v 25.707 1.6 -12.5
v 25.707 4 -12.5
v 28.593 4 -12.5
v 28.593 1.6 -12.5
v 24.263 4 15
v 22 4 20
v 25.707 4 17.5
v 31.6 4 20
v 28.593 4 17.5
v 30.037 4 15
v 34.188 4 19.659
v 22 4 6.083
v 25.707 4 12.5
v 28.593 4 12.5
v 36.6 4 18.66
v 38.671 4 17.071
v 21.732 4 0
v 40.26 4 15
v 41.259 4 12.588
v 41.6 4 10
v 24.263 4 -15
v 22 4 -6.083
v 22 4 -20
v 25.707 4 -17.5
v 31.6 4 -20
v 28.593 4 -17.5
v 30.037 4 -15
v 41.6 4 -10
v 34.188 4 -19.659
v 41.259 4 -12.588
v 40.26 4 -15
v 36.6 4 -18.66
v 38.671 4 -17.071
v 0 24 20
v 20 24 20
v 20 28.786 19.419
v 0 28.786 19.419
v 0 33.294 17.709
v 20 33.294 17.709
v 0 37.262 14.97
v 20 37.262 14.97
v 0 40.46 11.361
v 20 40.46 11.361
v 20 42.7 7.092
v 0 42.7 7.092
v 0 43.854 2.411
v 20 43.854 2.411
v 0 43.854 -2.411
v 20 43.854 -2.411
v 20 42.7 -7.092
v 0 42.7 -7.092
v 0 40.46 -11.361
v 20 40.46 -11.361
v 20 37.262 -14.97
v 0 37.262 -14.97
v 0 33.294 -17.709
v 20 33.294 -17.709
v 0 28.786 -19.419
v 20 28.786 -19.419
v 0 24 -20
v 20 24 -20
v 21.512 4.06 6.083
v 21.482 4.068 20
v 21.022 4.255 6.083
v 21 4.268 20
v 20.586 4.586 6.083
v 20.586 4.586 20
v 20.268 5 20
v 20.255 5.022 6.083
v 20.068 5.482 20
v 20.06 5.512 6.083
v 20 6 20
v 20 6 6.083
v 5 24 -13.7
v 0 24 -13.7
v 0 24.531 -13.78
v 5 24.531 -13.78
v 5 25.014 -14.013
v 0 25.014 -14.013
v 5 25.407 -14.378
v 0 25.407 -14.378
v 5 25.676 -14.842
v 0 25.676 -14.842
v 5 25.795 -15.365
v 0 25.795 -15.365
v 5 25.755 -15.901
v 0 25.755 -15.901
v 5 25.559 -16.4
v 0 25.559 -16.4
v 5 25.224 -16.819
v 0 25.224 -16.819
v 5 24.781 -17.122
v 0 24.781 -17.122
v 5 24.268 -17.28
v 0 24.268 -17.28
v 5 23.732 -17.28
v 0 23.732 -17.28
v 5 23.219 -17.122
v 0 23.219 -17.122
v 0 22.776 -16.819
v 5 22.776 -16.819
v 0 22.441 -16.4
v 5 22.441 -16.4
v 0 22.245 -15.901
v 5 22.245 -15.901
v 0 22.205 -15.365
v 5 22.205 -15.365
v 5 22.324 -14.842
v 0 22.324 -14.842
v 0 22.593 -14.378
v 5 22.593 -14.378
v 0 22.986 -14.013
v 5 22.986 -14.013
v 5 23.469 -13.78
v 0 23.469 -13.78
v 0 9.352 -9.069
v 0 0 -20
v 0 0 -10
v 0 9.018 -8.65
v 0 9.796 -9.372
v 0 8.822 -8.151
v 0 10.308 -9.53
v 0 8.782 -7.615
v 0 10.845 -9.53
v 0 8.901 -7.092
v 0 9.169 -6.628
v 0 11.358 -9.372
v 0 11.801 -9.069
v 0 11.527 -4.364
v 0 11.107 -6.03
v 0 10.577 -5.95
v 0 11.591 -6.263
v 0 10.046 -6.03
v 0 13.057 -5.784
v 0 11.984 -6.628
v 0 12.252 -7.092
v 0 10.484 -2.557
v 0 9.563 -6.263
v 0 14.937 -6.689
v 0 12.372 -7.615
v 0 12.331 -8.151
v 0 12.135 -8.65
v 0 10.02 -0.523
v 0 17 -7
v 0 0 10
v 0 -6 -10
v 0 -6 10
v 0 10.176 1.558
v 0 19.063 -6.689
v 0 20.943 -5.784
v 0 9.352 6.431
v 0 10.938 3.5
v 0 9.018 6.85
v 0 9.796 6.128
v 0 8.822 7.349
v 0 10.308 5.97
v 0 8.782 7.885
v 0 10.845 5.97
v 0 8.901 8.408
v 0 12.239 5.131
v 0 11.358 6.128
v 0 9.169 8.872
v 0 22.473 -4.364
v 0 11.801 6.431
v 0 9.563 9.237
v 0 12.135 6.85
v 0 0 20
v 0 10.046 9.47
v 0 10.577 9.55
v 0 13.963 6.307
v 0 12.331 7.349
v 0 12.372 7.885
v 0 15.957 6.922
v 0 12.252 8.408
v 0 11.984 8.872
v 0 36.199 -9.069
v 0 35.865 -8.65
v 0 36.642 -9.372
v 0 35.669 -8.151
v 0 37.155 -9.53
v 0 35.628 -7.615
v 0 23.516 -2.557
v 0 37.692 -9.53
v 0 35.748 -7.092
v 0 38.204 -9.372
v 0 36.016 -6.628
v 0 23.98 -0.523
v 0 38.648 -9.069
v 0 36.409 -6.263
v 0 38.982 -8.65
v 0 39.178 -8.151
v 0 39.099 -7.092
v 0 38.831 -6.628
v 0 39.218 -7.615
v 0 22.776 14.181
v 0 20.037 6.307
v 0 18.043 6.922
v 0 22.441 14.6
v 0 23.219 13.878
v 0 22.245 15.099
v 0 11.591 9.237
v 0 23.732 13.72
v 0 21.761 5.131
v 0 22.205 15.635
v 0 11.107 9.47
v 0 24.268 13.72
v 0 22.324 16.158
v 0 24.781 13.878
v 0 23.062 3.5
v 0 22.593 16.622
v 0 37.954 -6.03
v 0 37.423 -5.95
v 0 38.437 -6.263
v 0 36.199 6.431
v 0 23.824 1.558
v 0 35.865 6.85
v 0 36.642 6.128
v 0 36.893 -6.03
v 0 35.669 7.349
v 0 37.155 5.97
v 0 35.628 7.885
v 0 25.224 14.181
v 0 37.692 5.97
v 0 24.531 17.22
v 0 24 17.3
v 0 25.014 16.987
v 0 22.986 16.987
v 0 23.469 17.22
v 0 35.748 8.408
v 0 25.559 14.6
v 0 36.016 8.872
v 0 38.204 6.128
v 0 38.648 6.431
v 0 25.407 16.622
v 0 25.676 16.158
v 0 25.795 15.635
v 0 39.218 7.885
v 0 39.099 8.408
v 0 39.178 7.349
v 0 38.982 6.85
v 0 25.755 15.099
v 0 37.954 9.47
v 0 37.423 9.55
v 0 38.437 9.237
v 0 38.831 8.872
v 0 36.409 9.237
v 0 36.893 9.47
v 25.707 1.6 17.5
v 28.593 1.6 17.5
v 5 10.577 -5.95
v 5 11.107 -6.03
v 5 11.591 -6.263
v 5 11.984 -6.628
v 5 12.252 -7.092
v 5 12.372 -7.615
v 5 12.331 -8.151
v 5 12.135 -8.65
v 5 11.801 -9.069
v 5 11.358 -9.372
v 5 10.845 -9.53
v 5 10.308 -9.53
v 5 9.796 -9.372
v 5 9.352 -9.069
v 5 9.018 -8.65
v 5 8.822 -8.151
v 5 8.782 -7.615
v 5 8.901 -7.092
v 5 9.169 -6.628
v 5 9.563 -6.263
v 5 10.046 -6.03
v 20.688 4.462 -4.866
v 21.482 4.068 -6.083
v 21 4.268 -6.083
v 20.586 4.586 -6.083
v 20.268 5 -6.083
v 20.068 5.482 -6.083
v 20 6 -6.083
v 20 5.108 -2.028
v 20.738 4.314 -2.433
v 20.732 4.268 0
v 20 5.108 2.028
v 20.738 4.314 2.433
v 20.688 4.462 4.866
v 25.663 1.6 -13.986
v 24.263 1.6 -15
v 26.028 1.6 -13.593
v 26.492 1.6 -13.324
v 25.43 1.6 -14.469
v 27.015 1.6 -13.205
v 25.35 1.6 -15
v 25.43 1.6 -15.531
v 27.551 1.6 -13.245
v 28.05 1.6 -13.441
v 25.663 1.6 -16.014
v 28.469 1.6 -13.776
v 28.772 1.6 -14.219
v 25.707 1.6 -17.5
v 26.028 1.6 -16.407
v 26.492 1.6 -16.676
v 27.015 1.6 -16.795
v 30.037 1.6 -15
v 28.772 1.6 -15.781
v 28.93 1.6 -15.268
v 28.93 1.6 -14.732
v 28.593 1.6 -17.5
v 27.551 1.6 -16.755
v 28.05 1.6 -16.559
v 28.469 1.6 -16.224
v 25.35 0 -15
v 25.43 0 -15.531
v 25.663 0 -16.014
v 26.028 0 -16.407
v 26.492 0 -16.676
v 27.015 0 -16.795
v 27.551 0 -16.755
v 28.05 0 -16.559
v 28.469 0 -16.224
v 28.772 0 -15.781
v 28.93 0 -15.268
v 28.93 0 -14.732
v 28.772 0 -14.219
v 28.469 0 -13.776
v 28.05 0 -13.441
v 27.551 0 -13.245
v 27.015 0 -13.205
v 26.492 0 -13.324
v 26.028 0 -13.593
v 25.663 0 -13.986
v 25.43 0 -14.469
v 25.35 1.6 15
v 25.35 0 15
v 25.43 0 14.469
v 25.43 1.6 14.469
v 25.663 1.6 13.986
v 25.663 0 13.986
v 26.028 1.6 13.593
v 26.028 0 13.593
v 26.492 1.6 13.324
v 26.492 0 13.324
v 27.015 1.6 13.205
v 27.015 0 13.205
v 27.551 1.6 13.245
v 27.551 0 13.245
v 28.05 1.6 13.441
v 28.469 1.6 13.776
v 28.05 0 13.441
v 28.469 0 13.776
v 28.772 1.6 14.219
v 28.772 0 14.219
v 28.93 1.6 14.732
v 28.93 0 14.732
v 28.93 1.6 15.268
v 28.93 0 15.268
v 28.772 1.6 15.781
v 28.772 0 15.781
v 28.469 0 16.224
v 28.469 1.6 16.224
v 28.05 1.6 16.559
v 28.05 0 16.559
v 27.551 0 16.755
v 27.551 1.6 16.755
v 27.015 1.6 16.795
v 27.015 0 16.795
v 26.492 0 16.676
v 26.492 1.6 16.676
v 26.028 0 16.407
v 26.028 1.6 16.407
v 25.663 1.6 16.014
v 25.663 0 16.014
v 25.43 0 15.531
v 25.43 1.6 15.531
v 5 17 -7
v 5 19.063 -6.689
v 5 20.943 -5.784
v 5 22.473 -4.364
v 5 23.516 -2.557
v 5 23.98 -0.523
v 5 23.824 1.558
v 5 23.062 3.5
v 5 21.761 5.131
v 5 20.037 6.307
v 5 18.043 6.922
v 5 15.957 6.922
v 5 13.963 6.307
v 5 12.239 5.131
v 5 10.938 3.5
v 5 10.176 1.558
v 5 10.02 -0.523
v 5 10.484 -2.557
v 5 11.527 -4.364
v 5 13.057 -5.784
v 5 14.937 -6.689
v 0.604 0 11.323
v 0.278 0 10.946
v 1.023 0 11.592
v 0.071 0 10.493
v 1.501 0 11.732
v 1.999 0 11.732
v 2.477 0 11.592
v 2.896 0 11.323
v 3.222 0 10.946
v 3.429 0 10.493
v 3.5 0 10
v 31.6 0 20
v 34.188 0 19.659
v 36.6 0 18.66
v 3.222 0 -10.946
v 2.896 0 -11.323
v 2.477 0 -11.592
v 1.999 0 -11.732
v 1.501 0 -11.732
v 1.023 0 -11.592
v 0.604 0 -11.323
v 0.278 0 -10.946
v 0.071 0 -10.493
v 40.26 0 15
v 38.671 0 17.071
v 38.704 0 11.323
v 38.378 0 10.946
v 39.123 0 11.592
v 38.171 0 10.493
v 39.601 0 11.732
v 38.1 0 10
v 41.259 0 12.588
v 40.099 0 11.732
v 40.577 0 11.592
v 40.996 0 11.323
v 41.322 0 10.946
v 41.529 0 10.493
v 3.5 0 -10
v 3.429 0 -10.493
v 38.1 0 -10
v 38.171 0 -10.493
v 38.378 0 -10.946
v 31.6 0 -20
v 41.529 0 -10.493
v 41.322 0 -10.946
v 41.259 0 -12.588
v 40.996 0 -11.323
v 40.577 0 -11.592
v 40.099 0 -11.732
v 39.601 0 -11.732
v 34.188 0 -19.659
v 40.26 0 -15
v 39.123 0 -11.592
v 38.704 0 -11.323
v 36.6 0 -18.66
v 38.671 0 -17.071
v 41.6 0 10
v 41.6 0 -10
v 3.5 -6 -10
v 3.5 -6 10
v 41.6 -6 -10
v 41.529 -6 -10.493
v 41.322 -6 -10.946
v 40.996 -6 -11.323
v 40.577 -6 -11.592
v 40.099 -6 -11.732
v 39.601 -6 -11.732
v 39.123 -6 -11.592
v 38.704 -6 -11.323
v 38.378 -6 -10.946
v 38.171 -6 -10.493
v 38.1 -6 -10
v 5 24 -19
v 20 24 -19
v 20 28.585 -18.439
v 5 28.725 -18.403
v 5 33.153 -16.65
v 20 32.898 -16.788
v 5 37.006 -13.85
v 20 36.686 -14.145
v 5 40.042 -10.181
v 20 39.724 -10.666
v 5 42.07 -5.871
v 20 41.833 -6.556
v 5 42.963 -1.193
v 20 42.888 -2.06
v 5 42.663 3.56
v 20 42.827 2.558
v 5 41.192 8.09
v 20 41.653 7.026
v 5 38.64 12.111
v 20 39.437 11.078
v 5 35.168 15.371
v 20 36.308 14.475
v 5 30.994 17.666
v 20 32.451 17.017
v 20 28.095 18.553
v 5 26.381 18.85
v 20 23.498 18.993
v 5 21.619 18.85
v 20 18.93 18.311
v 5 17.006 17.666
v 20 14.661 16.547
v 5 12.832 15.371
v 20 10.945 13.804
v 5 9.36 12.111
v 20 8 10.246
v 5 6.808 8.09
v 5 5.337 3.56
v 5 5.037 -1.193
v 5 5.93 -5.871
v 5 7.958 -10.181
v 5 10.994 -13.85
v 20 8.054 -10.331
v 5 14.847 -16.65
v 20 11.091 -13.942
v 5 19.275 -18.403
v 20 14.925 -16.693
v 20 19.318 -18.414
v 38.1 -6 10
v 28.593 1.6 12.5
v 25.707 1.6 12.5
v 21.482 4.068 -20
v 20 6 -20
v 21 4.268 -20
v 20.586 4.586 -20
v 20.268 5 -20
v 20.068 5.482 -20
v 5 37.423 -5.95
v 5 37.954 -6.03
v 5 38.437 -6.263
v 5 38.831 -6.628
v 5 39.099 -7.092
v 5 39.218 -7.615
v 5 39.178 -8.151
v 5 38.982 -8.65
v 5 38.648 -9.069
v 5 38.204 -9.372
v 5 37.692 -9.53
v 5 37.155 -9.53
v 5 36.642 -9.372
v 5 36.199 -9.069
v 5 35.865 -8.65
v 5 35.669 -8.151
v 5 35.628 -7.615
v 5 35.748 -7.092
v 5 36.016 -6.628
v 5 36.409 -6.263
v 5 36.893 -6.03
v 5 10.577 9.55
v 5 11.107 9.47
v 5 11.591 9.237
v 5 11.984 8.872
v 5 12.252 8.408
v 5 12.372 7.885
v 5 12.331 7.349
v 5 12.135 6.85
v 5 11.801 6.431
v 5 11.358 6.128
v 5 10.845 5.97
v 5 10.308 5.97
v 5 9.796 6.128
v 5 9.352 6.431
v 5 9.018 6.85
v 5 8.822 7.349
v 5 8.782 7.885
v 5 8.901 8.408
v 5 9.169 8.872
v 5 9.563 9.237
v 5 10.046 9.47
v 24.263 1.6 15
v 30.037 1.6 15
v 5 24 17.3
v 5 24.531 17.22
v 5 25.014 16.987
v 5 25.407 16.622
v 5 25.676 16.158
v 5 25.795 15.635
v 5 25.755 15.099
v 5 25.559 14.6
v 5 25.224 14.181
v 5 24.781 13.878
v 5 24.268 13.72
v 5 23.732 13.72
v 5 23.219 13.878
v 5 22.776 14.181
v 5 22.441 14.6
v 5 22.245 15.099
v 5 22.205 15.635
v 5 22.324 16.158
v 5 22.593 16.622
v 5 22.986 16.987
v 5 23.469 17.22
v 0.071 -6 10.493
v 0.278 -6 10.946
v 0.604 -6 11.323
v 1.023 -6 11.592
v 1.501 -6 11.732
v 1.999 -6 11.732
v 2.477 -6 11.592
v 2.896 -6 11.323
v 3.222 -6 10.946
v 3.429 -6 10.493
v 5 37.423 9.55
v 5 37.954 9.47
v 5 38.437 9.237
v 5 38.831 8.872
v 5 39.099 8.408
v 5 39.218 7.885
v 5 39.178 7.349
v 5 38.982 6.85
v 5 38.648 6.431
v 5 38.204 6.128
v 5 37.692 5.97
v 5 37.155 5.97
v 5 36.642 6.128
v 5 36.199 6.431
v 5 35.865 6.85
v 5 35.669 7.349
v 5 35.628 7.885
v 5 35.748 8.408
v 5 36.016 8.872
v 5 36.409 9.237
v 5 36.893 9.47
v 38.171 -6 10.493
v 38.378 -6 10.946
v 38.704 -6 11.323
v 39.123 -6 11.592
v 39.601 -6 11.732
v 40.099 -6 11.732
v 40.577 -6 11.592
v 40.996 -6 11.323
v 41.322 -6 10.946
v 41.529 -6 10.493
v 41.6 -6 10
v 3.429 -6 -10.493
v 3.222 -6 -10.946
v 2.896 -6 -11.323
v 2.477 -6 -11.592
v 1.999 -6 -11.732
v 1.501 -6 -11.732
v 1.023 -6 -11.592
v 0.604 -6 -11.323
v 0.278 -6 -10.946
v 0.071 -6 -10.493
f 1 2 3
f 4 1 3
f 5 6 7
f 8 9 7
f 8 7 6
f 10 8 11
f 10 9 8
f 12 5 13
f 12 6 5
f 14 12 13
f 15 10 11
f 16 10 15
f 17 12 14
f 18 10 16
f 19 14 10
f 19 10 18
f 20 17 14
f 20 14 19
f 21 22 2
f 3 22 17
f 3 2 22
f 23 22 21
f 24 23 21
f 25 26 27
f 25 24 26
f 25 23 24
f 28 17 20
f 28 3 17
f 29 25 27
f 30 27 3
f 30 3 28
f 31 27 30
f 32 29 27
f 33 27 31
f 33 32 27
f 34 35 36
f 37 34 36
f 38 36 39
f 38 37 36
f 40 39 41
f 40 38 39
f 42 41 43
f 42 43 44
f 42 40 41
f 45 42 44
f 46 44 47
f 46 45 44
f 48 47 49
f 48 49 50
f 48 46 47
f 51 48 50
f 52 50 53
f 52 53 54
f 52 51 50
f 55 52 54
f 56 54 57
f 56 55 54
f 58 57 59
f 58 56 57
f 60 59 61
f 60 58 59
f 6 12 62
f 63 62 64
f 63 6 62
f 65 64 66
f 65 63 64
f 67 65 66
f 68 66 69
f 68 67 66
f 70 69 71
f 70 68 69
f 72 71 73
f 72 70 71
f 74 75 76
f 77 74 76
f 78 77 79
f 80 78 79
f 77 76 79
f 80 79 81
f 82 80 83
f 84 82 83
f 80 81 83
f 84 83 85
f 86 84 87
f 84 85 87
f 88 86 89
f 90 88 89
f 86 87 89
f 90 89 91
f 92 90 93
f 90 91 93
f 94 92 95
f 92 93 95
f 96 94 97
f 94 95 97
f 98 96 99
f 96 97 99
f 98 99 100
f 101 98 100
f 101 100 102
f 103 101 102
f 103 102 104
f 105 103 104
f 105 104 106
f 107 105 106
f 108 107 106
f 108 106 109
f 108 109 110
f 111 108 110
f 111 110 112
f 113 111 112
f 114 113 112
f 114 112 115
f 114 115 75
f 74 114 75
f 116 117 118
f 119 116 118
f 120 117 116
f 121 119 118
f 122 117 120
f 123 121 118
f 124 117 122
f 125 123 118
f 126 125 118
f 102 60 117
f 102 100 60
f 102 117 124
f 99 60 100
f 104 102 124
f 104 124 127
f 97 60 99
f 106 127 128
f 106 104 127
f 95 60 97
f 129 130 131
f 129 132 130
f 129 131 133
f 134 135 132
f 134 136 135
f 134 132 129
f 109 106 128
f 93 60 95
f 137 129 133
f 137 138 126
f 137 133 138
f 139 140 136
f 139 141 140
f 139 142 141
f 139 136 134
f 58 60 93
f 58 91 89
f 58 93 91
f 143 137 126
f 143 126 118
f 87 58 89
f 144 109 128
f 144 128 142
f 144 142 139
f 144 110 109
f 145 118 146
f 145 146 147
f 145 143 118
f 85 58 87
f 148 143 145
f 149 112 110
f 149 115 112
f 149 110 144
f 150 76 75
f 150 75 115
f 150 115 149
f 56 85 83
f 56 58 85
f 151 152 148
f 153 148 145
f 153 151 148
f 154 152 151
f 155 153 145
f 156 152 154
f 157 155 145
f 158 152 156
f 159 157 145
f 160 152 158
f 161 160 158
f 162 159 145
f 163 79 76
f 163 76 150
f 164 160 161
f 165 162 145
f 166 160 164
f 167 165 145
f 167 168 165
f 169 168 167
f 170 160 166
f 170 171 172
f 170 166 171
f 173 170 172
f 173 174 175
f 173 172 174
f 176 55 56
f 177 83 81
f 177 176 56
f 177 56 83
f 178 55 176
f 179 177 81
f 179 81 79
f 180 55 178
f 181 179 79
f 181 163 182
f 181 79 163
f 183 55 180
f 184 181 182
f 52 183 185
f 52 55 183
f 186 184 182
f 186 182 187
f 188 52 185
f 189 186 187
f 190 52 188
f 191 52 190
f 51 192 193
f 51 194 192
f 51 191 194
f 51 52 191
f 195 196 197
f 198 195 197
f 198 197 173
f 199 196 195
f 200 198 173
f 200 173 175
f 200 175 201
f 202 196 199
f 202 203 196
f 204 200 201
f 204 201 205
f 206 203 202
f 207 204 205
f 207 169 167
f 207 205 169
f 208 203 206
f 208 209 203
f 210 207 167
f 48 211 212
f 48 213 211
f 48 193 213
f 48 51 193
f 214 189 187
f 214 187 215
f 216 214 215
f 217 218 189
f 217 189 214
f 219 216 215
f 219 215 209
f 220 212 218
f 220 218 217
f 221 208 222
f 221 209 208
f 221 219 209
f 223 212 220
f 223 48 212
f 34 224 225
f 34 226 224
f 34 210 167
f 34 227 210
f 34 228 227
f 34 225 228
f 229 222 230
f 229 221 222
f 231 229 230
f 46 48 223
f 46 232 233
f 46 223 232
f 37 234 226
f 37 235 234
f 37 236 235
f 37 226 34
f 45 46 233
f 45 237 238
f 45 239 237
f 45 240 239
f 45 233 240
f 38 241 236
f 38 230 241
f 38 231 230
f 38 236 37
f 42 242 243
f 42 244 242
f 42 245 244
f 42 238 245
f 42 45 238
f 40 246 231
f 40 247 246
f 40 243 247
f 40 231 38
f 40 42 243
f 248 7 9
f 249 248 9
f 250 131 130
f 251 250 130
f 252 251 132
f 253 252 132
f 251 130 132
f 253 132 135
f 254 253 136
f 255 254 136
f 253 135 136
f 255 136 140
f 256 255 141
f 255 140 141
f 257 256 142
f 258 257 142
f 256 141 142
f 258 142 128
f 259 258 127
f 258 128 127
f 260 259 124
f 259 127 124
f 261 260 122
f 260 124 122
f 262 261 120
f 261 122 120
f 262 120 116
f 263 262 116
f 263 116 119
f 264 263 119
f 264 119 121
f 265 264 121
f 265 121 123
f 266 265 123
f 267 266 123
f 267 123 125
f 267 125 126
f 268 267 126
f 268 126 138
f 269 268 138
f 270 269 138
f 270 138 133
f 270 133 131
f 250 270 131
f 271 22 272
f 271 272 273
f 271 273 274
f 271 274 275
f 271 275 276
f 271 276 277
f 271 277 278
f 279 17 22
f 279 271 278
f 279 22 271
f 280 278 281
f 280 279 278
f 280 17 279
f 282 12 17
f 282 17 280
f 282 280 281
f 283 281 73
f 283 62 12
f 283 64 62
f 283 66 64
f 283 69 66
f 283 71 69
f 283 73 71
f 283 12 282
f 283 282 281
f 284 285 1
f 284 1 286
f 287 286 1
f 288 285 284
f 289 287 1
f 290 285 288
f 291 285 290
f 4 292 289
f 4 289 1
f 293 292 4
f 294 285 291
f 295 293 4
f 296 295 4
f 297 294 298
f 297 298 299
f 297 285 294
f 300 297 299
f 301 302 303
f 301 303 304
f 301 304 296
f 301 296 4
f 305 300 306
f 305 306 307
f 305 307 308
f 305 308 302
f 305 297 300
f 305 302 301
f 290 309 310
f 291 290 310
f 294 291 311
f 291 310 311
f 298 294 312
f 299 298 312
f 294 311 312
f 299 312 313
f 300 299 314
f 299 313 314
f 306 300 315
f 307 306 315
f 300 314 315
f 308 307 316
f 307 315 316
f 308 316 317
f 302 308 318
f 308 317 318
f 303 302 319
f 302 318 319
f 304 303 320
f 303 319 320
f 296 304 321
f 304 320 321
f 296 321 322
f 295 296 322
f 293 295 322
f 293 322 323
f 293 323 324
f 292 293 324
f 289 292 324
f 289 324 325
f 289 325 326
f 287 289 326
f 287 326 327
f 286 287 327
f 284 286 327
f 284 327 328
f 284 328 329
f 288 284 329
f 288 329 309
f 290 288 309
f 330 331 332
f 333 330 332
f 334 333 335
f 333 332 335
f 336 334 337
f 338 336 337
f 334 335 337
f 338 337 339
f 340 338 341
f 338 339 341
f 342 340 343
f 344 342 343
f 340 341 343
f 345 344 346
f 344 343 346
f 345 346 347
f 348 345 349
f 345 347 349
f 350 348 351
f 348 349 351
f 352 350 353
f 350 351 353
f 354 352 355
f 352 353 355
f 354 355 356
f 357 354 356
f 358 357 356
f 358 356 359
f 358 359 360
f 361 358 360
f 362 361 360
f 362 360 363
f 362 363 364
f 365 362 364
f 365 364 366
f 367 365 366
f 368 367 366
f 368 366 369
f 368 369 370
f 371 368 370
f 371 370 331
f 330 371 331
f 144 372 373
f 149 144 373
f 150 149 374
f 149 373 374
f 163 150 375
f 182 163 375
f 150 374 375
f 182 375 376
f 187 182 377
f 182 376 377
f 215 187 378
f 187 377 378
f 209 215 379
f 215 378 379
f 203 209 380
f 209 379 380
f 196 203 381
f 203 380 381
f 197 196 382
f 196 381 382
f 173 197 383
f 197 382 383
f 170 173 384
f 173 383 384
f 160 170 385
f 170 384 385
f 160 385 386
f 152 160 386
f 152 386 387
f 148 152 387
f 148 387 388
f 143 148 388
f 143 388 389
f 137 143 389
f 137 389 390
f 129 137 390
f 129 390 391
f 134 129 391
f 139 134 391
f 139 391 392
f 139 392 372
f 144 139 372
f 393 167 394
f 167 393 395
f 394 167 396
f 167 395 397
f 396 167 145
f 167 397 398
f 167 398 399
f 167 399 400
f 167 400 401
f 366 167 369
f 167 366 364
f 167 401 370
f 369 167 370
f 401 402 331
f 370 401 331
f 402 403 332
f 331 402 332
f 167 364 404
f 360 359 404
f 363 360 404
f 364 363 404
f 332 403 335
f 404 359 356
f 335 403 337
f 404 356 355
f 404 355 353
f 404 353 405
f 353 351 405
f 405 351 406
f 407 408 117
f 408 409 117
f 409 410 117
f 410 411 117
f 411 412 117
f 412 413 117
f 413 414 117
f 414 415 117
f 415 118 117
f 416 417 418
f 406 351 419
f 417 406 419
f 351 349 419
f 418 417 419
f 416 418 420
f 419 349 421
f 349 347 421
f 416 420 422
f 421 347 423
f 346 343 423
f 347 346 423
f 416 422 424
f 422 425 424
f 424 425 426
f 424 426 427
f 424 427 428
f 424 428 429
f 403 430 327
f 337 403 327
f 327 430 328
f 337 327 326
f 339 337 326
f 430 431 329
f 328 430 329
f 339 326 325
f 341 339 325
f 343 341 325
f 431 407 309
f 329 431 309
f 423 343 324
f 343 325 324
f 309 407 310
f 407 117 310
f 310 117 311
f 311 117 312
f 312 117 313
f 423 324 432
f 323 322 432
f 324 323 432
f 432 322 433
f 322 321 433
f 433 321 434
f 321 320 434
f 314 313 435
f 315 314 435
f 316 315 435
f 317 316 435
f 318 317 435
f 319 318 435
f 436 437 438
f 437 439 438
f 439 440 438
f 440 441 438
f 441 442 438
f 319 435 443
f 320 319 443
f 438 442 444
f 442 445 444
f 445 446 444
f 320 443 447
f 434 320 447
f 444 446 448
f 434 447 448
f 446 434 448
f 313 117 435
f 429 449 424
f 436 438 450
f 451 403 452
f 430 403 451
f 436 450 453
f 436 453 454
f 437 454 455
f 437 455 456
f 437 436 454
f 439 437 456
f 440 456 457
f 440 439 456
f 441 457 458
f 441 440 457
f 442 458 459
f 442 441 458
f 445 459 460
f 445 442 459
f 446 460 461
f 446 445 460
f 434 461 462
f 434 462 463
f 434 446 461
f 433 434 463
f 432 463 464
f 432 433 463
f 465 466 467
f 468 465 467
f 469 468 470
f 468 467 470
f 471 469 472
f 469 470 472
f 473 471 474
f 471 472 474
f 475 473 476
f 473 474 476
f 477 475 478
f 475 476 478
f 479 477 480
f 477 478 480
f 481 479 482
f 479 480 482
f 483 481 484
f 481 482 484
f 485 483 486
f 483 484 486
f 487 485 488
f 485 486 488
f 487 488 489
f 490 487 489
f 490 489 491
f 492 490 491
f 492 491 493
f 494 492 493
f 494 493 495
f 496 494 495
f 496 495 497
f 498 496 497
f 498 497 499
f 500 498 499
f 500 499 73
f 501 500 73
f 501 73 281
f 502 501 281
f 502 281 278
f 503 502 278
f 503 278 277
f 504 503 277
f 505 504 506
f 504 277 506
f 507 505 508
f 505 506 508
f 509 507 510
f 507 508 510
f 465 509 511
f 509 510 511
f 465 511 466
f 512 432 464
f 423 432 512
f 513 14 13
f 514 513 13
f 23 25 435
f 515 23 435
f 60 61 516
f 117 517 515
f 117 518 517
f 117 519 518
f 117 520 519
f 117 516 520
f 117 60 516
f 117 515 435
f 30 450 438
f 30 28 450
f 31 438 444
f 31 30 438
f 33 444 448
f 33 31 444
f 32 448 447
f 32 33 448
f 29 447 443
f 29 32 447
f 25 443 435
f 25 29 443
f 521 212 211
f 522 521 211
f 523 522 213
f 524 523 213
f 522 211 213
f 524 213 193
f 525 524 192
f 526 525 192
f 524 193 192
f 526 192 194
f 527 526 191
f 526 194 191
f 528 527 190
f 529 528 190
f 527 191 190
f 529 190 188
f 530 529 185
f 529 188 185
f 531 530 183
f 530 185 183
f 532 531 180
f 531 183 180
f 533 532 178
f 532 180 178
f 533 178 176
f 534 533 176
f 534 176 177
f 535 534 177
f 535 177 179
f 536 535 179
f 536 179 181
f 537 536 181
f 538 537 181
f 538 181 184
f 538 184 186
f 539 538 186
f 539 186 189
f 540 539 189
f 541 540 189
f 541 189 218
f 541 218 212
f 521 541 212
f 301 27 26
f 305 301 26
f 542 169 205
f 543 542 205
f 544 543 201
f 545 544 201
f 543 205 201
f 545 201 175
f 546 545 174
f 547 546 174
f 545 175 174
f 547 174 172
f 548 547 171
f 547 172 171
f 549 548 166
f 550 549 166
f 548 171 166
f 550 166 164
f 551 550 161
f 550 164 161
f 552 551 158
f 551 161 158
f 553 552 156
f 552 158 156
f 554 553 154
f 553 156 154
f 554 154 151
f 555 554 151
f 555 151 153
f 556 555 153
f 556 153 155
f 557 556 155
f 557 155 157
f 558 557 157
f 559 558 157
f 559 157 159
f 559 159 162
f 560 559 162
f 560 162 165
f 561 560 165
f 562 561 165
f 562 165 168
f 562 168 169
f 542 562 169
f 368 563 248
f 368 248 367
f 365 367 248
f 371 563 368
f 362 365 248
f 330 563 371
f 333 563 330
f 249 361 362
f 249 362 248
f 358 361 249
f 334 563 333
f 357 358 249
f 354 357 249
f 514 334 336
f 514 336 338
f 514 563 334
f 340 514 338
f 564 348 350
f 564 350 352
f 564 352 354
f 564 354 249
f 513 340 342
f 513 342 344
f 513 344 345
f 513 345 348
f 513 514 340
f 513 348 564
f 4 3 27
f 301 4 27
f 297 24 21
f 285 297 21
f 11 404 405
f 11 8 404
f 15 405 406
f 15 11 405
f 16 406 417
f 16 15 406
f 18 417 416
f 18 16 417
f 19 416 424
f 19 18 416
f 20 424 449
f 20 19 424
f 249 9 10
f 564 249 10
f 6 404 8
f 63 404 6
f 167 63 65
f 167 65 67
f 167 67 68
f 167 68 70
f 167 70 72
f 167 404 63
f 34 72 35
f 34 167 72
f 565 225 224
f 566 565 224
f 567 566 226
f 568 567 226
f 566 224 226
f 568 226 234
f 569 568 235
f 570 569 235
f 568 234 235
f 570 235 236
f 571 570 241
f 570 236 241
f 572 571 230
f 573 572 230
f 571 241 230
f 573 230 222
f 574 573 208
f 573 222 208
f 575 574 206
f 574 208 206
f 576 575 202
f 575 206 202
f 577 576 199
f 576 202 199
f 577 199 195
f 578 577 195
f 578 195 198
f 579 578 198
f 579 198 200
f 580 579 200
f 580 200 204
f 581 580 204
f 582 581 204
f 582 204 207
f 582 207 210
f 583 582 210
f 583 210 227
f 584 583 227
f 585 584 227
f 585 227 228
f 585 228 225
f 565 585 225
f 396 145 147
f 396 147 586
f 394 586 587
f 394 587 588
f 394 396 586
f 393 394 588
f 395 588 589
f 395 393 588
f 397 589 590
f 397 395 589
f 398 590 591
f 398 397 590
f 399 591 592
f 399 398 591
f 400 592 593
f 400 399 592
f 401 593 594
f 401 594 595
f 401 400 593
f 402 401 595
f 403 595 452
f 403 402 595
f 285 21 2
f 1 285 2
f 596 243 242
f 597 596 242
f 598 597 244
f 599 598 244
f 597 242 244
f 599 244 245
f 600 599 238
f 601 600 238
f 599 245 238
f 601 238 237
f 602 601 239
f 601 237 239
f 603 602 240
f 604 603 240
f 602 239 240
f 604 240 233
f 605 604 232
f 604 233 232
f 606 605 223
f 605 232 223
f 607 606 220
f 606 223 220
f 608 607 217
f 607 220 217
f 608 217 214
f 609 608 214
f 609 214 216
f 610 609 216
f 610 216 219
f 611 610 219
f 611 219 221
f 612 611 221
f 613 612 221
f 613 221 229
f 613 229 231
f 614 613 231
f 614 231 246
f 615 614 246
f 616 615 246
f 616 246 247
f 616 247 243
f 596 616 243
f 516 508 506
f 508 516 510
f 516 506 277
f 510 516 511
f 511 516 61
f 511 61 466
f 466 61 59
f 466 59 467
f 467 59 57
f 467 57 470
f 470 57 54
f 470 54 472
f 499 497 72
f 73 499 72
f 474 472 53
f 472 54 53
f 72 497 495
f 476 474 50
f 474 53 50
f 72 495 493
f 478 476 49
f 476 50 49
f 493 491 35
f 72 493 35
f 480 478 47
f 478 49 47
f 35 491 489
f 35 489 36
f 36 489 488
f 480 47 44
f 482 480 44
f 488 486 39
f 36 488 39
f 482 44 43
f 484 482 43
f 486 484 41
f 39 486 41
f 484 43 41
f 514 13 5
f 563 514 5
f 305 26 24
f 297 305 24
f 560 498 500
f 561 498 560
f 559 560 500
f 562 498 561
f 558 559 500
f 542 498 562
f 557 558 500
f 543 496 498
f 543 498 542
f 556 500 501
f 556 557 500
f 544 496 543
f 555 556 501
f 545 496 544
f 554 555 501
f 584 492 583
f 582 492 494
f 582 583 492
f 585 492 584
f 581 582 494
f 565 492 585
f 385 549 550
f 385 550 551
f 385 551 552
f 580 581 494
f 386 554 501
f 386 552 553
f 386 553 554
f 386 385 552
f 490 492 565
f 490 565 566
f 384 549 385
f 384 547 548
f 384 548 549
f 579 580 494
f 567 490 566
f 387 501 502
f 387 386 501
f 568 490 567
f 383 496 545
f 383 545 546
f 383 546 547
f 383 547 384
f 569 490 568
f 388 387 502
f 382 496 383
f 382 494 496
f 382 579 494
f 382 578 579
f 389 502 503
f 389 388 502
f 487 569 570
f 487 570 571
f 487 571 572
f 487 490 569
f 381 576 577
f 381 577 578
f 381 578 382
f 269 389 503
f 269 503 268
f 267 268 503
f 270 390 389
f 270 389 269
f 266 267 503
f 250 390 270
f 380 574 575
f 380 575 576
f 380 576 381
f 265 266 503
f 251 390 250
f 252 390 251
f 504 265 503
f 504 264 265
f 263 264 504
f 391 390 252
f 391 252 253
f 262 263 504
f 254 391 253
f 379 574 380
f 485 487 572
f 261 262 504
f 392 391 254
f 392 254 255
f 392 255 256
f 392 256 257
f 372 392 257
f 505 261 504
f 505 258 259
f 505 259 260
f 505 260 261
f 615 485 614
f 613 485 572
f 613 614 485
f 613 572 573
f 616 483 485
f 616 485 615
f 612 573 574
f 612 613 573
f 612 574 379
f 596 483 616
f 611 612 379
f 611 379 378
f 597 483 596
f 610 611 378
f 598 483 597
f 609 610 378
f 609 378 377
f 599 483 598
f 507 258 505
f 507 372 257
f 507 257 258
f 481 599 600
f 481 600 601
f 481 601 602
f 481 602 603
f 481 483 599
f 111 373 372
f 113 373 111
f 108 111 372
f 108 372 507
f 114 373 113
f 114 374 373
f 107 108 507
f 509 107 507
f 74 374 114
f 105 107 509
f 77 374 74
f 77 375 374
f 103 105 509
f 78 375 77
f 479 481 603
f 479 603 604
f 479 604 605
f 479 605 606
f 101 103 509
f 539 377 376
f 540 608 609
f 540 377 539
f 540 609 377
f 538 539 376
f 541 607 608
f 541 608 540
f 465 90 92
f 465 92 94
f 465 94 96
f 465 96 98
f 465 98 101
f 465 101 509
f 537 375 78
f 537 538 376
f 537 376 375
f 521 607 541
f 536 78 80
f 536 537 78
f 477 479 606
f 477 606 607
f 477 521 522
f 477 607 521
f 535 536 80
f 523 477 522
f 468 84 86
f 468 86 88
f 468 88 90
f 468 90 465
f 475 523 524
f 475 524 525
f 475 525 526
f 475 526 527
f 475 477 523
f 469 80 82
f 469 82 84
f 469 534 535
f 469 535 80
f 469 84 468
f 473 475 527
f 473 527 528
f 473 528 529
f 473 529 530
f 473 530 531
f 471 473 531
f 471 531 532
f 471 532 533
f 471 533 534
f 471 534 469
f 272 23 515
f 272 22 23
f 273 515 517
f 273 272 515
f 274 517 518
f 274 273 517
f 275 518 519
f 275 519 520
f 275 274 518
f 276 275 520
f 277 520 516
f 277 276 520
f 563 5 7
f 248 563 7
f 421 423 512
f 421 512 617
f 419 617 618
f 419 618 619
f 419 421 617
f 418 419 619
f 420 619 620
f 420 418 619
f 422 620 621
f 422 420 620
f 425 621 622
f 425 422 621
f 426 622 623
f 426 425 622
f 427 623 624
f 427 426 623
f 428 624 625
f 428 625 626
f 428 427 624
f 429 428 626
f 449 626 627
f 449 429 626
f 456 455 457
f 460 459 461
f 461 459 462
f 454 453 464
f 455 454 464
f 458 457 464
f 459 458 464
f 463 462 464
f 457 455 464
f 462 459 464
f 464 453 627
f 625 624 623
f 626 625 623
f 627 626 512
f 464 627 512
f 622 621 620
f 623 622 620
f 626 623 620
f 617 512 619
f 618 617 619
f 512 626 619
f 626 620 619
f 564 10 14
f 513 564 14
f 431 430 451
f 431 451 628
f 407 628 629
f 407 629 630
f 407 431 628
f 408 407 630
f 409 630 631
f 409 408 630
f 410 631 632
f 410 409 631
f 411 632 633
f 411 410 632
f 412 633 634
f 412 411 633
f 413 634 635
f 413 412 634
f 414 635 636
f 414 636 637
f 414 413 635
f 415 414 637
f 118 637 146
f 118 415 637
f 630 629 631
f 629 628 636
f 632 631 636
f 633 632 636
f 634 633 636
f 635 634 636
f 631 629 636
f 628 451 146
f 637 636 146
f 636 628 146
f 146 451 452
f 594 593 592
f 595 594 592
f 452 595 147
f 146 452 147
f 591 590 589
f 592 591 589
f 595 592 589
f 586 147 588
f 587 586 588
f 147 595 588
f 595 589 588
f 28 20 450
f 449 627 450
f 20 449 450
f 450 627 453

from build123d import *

# Parameters (mm, degrees)
ESQUISSE1_W             = 41.6
ESQUISSE1_H             = 40
BOSS_EXTRU_1_DEPTH      = 4
BOSS_EXTRU_2_DEPTH      = 20
ESQUISSE3_R             = 19
ENL_V_MAT_EXTRU_1_DEPTH = 15
ENL_V_MAT_EXTRU_2_REACH = 62.626
ESQUISSE5_R             = 7
BOSS_EXTRU_3_DEPTH      = 6
D_GAGEMENT_M31_D        = 3.6
CONG_1_R                = 10
D_GAGEMENT_M32_D        = 3.6
ENL_V_MAT_EXTRU_3_DEPTH = 2.4
CONG_2_R                = 2


with BuildPart() as part:
    # Esquisse1 → Boss.-Extru.1 (new body)
    with BuildSketch(Plane(origin=(0, 0, 0), x_dir=(1, 0, 0), z_dir=(0, 1, 0))):
        with Locations((20.8, 0)):
            Rectangle(ESQUISSE1_W, ESQUISSE1_H)
    extrude(amount=BOSS_EXTRU_1_DEPTH)

    # Esquisse2 → Boss.-Extru.2 (add)
    with BuildSketch(Plane.ZY):
        with BuildLine():
            Line((-20, 4), (20, 4))
            Line((20, 4), (20, 24))
            ThreePointArc((20, 24), (0, 44), (-20, 24))
            Line((-20, 24), (-20, 4))
        make_face()
    extrude(amount=-BOSS_EXTRU_2_DEPTH)

    # Esquisse3 → Enlèv. mat.-Extru.1 (cut)
    with BuildSketch(Plane(origin=(20, 0, 0), x_dir=(0, 0, -1), z_dir=(1, 0, 0))):
        with Locations((0, 24)):
            Circle(ESQUISSE3_R)
    extrude(amount=-ENL_V_MAT_EXTRU_1_DEPTH, mode=Mode.SUBTRACT)

    # Esquisse5 → Enlèv. mat.-Extru.2 (cut, up to next)
    with BuildSketch(Plane(origin=(5, 0, 0), x_dir=(0, 0, -1), z_dir=(1, 0, 0)), mode=Mode.PRIVATE) as enl_v_mat_extru_2_sk1:
        with Locations((0, 17)):
            Circle(ESQUISSE5_R)
    enl_v_mat_extru_2_tool1 = extrude(enl_v_mat_extru_2_sk1.sketch, amount=-ENL_V_MAT_EXTRU_2_REACH, mode=Mode.PRIVATE) & part.part
    add(enl_v_mat_extru_2_tool1.solids().sort_by_distance((5, 17, 0))[0], mode=Mode.SUBTRACT)

    # Esquisse6 → Boss.-Extru.3 (add)
    with BuildSketch(Plane.XZ):
        with BuildLine():
            Line((3.5, 10), (3.5, -10))
            ThreePointArc((3.5, -10), (1.75, -11.75), (0, -10))
            Line((0, -10), (0, 10))
            ThreePointArc((0, 10), (1.75, 11.75), (3.5, 10))
        make_face()
        with BuildLine():
            Line((41.6, 10), (41.6, -10))
            ThreePointArc((41.6, -10), (39.85, -11.75), (38.1, -10))
            Line((38.1, -10), (38.1, 10))
            ThreePointArc((38.1, 10), (39.85, 11.75), (41.6, 10))
        make_face()
    extrude(amount=BOSS_EXTRU_3_DEPTH)

    # Dégagement M31 (through all)
    with Locations(Plane(origin=(5, 0, 0), x_dir=(0, 0, -1), z_dir=(1, 0, 0))):
        with Locations((-15.5, 24), (-7.75, 37.423393759), (7.75, 37.423393759), (15.5, 24), (7.75, 10.576606241), (-7.75, 10.576606241)):
            Hole(D_GAGEMENT_M31_D / 2)

    # Congé1
    cong_1_edges = [part.edges().sort_by_distance(p)[0] for p in [
        (41.6, 2, -20),
        (41.6, 2, 20),
    ]]
    fillet(cong_1_edges, radius=CONG_1_R)

    # Dégagement M32 (through all)
    with Locations(Plane(origin=(0, 4, 0), x_dir=(1, 0, 0), z_dir=(0, 1, 0))):
        with Locations((27.15, -15), (27.15, 15)):
            Hole(D_GAGEMENT_M32_D / 2)

    # Esquisse12 → Enlèv. mat.-Extru.3 (cut)
    with BuildSketch(Plane(origin=(0, 4, 0), x_dir=(1, 0, 0), z_dir=(0, 1, 0))):
        Polygon((30.036751346, -15), (28.593375673, -12.5), (25.706624327, -12.5), (24.263248654, -15), (25.706624327, -17.5), (28.593375673, -17.5), align=None)
        Polygon((30.036751346, 15), (28.593375673, 17.5), (25.706624327, 17.5), (24.263248654, 15), (25.706624327, 12.5), (28.593375673, 12.5), align=None)
    extrude(amount=-ENL_V_MAT_EXTRU_3_DEPTH, mode=Mode.SUBTRACT)

    # Congé2
    cong_2_edges = [part.edges().sort_by_distance(p)[0] for p in [
        (20, 4, 0),
    ]]
    fillet(cong_2_edges, radius=CONG_2_R)


solid = part.part
